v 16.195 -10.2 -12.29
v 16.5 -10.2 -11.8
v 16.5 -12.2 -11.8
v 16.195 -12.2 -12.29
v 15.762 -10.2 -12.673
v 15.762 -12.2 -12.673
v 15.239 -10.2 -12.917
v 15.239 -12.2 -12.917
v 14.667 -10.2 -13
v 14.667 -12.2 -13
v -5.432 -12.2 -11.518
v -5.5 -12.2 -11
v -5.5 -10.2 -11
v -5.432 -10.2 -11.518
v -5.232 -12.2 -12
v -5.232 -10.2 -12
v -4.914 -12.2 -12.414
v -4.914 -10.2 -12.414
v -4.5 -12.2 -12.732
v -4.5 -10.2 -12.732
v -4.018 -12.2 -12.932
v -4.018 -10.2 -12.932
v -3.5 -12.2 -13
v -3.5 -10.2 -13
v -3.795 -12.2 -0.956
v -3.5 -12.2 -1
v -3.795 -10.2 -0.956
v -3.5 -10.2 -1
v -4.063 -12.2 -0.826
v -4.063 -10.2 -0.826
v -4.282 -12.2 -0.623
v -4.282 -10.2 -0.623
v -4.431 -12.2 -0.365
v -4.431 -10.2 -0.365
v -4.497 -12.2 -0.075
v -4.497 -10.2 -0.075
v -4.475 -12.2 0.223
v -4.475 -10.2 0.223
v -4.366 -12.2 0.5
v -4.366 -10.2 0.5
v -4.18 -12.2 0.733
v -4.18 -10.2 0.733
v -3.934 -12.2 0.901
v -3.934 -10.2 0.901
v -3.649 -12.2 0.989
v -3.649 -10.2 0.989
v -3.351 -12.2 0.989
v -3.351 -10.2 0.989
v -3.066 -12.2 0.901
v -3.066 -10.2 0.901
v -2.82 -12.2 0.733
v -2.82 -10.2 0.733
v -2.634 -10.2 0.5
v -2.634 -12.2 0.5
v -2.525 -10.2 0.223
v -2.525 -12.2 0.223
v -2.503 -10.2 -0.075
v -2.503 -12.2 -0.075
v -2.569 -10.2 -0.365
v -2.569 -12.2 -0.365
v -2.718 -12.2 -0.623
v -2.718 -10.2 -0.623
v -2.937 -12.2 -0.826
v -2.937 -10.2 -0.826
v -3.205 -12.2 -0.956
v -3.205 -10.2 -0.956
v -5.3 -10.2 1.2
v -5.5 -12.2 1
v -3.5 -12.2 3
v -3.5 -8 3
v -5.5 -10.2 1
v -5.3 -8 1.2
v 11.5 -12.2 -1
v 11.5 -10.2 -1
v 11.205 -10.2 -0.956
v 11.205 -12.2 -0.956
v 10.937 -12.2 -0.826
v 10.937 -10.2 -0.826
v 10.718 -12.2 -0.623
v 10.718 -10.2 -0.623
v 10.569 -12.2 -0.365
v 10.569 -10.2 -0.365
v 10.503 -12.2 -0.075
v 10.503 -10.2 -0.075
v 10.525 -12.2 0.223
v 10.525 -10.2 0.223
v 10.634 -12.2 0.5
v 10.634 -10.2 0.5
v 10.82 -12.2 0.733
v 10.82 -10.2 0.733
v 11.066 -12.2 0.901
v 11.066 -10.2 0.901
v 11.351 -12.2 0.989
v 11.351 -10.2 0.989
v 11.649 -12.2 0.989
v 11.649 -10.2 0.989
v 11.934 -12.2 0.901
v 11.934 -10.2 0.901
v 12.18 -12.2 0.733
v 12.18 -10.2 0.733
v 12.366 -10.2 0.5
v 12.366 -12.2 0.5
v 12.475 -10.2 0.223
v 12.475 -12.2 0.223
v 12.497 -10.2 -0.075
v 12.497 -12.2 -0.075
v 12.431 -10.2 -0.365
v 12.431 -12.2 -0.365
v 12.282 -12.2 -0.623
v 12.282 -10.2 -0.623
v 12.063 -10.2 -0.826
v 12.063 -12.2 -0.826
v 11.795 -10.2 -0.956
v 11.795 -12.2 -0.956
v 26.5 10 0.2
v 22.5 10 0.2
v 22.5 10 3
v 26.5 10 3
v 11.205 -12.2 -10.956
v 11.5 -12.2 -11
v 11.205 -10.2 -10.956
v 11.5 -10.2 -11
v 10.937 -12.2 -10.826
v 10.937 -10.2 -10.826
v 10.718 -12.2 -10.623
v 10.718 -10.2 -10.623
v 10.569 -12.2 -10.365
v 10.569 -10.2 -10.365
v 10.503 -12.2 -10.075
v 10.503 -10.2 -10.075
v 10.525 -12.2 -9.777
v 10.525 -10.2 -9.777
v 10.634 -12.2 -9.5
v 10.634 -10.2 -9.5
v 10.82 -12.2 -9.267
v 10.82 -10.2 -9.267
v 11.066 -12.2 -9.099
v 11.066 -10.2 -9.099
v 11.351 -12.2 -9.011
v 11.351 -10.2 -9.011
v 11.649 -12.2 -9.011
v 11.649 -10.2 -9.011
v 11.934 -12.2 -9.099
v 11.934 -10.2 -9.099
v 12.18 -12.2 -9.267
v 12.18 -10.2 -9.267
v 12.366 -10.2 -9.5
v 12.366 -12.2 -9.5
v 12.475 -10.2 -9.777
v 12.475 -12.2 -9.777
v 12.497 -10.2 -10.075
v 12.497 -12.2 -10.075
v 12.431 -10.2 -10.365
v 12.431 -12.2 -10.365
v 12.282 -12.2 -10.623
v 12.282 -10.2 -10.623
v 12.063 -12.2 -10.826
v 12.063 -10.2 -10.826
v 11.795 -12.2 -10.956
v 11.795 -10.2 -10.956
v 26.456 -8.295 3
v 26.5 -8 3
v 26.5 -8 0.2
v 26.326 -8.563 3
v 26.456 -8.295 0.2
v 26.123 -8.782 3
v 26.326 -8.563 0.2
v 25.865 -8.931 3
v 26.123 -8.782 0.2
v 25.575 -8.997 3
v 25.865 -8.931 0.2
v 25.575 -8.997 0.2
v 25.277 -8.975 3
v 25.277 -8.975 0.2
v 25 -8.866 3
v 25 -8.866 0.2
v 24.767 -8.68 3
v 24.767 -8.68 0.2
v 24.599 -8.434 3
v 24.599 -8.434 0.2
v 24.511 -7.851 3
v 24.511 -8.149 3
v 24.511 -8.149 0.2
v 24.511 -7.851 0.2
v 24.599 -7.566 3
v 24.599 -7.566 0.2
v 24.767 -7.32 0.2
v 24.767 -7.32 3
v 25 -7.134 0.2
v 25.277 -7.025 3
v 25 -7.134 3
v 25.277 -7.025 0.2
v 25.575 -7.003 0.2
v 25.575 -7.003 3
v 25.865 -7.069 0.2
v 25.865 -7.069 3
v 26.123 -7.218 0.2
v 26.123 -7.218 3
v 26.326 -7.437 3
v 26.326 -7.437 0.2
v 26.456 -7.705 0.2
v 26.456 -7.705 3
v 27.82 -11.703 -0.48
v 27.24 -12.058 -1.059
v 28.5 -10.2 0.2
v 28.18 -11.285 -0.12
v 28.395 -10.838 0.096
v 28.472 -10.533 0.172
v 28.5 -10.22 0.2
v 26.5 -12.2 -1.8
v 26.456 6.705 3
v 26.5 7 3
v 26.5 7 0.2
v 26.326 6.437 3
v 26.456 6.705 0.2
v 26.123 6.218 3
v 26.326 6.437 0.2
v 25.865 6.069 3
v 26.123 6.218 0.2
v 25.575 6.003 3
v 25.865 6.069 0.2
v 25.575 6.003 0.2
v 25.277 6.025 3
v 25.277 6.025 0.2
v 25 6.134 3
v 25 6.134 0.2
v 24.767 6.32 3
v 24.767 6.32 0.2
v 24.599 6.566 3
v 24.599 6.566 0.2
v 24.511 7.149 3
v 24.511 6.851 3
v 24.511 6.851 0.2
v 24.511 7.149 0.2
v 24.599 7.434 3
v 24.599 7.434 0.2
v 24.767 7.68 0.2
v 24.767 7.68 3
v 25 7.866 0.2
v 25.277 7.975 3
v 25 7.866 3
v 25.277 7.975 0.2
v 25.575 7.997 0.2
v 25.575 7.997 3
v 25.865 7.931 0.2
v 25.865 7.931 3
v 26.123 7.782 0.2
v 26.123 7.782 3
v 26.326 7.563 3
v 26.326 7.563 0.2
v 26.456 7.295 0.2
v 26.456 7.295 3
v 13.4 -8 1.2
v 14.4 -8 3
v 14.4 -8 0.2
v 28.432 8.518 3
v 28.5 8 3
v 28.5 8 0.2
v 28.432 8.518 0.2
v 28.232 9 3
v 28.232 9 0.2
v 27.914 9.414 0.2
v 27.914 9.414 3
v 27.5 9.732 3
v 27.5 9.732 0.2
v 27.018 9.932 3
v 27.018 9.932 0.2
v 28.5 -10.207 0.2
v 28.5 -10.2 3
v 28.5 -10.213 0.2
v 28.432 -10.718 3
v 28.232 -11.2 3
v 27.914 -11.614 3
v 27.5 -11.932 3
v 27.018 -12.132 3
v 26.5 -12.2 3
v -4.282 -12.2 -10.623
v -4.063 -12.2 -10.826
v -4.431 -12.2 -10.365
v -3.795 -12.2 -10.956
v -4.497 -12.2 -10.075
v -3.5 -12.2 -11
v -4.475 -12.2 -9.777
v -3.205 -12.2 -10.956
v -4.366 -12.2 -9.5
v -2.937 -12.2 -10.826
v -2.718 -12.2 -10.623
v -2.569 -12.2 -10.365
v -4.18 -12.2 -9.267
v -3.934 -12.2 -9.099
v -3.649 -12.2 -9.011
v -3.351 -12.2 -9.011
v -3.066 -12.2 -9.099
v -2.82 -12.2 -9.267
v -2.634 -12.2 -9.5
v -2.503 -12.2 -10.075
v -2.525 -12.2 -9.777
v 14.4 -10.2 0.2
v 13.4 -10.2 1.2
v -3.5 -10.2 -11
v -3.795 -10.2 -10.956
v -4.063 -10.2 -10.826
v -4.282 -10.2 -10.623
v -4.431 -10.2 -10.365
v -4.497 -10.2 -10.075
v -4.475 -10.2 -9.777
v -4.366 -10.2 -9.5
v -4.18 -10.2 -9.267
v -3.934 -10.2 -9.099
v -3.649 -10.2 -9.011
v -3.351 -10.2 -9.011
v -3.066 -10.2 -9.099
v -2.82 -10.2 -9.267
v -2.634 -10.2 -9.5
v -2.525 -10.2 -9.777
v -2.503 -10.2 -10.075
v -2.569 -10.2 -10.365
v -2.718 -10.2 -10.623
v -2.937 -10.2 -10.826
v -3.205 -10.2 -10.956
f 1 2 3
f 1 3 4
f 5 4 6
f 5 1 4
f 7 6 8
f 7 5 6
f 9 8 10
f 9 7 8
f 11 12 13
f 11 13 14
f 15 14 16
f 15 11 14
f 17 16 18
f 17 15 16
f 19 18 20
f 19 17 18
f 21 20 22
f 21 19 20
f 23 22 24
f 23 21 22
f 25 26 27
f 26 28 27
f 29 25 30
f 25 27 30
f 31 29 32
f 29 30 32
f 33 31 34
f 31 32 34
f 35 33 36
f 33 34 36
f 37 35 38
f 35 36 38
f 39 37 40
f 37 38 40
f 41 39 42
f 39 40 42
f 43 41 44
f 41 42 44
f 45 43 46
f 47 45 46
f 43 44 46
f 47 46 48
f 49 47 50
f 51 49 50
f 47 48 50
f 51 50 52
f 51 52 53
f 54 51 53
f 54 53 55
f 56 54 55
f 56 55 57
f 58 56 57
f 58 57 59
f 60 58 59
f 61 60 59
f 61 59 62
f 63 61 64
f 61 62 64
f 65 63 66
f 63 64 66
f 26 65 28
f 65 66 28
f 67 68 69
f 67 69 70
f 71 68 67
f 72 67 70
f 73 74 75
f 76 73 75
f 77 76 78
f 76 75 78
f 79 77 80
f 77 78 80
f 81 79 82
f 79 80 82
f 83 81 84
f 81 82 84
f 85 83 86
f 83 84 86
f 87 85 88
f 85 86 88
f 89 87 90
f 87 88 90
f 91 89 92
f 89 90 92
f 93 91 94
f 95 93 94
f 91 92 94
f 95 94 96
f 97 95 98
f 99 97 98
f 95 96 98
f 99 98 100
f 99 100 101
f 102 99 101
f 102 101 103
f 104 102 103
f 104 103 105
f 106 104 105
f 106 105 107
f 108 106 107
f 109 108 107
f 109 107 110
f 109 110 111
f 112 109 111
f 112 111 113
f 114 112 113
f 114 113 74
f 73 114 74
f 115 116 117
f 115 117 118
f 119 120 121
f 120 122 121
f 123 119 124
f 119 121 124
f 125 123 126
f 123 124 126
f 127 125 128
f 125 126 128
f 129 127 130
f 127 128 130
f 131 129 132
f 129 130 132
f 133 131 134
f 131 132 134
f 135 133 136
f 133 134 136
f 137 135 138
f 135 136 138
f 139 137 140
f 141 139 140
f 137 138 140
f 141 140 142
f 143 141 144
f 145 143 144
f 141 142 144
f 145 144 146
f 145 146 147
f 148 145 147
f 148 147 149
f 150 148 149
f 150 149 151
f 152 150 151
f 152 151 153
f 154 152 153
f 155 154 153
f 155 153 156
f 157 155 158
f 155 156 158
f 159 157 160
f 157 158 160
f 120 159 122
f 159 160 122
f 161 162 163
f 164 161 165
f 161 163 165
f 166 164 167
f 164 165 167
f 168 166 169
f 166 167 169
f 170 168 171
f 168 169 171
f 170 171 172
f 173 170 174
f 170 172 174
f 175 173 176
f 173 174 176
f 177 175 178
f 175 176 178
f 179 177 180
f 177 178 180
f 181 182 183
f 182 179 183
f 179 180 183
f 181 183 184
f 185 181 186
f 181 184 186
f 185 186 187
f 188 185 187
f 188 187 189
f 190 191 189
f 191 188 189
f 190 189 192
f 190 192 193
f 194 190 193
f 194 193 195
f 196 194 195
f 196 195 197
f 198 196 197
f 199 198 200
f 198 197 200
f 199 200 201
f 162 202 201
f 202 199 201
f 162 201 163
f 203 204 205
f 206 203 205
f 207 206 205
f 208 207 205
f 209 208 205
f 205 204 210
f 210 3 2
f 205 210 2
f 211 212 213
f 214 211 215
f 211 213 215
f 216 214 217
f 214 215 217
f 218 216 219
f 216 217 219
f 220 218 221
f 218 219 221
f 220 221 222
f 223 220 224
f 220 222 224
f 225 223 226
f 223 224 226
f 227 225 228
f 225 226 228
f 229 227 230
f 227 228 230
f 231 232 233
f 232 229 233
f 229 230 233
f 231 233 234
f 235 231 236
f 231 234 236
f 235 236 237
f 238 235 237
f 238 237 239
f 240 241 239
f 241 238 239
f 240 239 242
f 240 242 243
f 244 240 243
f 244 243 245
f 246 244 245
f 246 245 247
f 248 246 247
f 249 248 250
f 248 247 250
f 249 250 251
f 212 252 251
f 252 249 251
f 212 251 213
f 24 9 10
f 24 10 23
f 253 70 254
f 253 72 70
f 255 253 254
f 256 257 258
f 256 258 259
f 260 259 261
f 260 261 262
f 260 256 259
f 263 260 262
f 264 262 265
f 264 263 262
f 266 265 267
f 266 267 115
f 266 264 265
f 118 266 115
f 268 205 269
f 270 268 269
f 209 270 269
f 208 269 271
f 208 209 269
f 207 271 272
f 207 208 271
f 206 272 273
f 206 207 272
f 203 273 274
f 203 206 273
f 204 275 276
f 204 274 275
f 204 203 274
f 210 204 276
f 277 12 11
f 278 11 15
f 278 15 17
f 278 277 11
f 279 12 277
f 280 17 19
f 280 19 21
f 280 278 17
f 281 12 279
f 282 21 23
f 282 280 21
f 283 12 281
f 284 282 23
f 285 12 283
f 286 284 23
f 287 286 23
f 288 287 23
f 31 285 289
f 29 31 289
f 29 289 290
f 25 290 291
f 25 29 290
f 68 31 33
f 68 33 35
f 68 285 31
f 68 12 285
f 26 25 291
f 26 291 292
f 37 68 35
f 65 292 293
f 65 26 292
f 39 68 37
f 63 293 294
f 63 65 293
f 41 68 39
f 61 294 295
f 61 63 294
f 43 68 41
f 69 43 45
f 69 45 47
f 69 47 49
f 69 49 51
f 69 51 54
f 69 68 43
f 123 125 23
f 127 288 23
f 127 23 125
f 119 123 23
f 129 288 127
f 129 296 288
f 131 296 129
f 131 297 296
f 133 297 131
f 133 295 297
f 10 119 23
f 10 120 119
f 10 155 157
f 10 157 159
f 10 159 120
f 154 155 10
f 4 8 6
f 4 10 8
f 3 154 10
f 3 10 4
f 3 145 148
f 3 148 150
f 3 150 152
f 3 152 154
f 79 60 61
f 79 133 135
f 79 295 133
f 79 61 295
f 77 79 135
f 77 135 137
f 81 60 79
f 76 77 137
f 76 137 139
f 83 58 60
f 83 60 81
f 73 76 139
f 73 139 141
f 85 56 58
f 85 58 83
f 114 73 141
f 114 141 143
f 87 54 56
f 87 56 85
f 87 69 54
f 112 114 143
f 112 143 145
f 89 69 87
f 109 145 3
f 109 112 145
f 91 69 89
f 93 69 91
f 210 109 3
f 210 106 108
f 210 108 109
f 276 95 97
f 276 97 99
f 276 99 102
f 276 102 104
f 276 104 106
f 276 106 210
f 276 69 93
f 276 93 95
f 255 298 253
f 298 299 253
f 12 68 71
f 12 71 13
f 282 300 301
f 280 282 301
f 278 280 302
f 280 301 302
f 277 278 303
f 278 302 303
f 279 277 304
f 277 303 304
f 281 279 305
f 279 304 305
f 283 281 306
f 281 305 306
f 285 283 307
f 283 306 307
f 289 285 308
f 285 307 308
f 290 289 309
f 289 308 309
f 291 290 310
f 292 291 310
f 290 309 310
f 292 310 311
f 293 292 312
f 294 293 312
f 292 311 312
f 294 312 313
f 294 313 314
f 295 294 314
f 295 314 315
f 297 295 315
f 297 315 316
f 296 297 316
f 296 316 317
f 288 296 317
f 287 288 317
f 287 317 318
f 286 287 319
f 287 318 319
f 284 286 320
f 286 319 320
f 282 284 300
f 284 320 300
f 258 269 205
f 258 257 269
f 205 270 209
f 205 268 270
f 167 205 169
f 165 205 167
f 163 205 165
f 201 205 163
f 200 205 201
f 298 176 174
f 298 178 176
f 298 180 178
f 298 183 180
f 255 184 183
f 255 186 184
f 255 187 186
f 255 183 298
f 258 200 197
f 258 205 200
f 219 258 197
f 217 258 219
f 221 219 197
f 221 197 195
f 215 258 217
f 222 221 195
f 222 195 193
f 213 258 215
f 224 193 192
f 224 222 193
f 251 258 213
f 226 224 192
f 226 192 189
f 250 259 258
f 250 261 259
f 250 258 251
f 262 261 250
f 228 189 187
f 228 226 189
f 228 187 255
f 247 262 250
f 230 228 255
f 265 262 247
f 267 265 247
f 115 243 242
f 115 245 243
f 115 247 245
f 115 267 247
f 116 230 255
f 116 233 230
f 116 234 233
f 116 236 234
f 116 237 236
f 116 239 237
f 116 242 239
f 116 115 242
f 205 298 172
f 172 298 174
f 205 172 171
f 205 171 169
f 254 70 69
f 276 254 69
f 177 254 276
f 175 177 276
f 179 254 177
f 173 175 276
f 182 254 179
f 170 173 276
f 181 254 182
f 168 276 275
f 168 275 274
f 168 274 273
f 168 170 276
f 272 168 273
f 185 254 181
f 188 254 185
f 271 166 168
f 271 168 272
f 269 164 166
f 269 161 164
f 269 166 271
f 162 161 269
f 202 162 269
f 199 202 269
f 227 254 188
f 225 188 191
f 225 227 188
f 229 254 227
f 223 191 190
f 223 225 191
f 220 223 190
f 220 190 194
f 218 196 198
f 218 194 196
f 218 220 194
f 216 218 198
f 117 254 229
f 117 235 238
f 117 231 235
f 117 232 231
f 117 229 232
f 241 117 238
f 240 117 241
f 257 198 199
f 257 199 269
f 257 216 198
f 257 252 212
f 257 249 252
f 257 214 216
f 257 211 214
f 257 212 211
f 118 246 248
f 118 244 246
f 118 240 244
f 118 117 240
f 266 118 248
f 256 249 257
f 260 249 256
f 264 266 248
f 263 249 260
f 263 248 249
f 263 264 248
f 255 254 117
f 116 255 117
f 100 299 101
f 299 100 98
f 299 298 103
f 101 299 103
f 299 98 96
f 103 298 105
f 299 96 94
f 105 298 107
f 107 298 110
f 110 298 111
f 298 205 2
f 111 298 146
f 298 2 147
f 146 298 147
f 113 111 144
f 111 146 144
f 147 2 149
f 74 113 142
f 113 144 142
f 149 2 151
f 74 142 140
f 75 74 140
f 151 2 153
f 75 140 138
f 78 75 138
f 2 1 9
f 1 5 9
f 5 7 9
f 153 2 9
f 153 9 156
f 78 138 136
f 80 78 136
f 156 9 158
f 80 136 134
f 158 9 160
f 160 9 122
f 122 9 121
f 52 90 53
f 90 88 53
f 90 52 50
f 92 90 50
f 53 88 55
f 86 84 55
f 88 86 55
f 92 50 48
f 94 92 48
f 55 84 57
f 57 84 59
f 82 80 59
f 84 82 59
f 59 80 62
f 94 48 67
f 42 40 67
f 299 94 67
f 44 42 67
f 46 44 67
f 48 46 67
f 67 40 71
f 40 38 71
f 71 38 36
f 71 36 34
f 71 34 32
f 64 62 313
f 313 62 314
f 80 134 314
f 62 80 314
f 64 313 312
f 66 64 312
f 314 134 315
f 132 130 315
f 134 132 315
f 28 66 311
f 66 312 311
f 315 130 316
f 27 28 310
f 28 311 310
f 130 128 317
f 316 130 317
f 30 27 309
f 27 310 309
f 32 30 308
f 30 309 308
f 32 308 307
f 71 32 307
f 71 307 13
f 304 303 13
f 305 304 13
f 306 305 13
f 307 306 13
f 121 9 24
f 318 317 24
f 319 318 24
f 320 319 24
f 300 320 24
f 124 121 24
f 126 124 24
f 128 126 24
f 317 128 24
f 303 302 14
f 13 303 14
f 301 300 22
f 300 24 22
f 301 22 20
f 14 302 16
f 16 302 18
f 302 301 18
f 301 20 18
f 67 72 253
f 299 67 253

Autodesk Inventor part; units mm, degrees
ref_plane "YZ Plane" through (0, 0, 0) normal (1, 0, 0) x (0, 1, 0)
ref_plane "XZ Plane" through (0, 0, 0) normal (0, 1, 0) x (-1, 0, 0)
ref_plane "XY Plane" through (0, 0, 0) normal (0, 0, 1) x (1, 0, 0)
sketch "Sketch1" plane through (0, 0, 0) normal (0, 0, 1) x (1, 0, 0)
  line L0 (22.5, 10) -> (28.5, 10)
  line L1 (28.5, 10) -> (28.5, -10)
  line L2 (28.5, -10) -> (22.5, -10)
  line L3 (22.5, -10) -> (22.5, 10)
  line L4 (22.5, -10) -> (-28.5, -10)
  line L5 (-28.5, -10) -> (-28.5, -8)
  line L6 (-28.5, -8) -> (22.5, -8)
  line L7 (22.5, -8) -> (22.5, -10)
  circle A0 centre (25.5, 7) radius 1
  circle A1 centre (25.5, -8) radius 1
  point P0 (0, 0)
  dimension "d0" = 57
  dimension "d1" = 2
  dimension "d2" = 28.5
  dimension "d3" = 20
  dimension "d4" = 10
  dimension "d5" = 54
  dimension "d6" = 54
  dimension "d7" = 2
  dimension "d8" = 17
  dimension "d9" = 3
  dimension "d10" = 3
  dimension "d11" = 2
  dimension "d12" = 2
extrude "Extrusion1" add sketch "Sketch1" along normal blind 3
sketch "Sketch2" plane through (0, 0, 3) normal (0, 0, 1) x (1, 0, 0)
  line L0 (-28.5, -10) -> (28.5, -10) projected
  line L1 (28.5, 10) -> (22.5, 10) projected
  line L2 (13.5, -10) -> (22.5, 10)
  line L3 (22.5, -8) -> (-28.5, -8) projected
  line L4 (22.5, 10) -> (22.5, -8)
  line L5 (22.5, -8) -> (13.5, -10)
  point P0 (0, 0)
  point P1 (14.4, -8)
  dimension "d15" = 42
extrude "Extrusion2" add sketch "Sketch2" against normal blind 3 contours L2 L4 L3
sketch "Sketch4" plane through (-28.5, -10, 0) normal (0, -1, 0) x (1, 0, 0)
  line L0 (0, 3) -> (57, 3) projected
  line L1 (0, 3) -> (57, 3)
  line L2 (57, 3) -> (57, -13)
  line L3 (57, -13) -> (0, -13)
  line L4 (0, -13) -> (0, 3)
  line L5 (57, 0) -> (57, 3) projected
  point P0 (28.5, 0)
  dimension "d22" = 16
extrude "Extrusion4" add sketch "Sketch4" along normal blind 2.2
sketch "Sketch5" plane through (-28.5, -10, 0) normal (0, 1, 0) x (1, 0, 0)
  line L0 (0, 0) -> (57, 0) projected
  line L1 (0, 13) -> (57, 13) projected
  line L2 (0, 0) -> (57, 0)
  line L3 (57, 0) -> (57, 13)
  line L4 (57, 13) -> (0, 13)
  line L5 (0, 13) -> (0, 0)
  point P0 (28.5, 0)
extrude "Extrusion5" cut sketch "Sketch5" against normal blind 0.2
sketch "Sketch6" plane through (0, 0, 0) normal (0, 0, -1) x (-1, 0, 0)
  line L0 (-28.5, 10) -> (-28.5, -12.2) projected
  line L1 (-28.5, -10.2) -> (28.5, -10.2) projected
  line L2 (-28.5, 10) -> (28.5, 10)
  line L3 (28.5, 10) -> (28.5, -10.2)
  line L4 (28.5, -10.2) -> (-28.5, -10.2)
  line L5 (-28.5, -10.2) -> (-28.5, 10)
  point P0 (0, 0)
extrude "Extrusion6" cut sketch "Sketch6" against normal blind 0.2
sketch "Sketch7" plane through (-28.5, -12.2, 0) normal (0, -1, 0) x (1, 0, 0)
  line L0 (0, 3) -> (0, -13) projected
  line L1 (57, 3) -> (0, 3) projected
  point P0 (28.5, 0)
  point P1 (25, 0)
  point P2 (25, -10)
  point P3 (40, 0)
  point P4 (40, -10)
  dimension "d29" = 25
  dimension "d30" = 40
  dimension "d31" = 25
  dimension "d32" = 40
  dimension "d33" = 10
  dimension "d34" = 10
  dimension "d35" = 3
  dimension "d36" = 3
hole "Hole1" at (-3.5, -12.2, 0) at (-3.5, -12.2, -10) at (11.5, -12.2, 0) at (11.5, -12.2, -10) direction (0, 1, 0) diameter 2 depth 5 tip angle 118
sketch "Sketch8" plane through (-28.5, -8, 3) normal (0, 1, 0) x (1, 0, 0)
  line L0 (42.9, 2.8) -> (40.9798, 2.8) projected
  line L1 (42.9, 2.8) -> (20.9, 2.8)
  line L2 (20.9, 2.8) -> (20.9, 1.8)
  line L3 (20.9, 1.8) -> (42.9, 1.8)
  line L4 (42.9, 1.8) -> (42.9, 2.8)
  point P0 (28.5, 3)
  dimension "d44" = 22
  dimension "d45" = 1
extrude "Extrusion7" cut sketch "Sketch8" against normal blind 2.2
chamfer "Chamfer1" distance 1 angle 45 2 edges at (-7.6, -9.1, 0.2) (14.4, -9.1, 1.2)
sketch "Sketch9" plane through (-28.5, -12.2, 0) normal (0, -1, 0) x (1, 0, 0)
  line L0 (0, 3) -> (0, -13) projected
  line L1 (0, -13) -> (57, -13) projected
  line L2 (0, 3) -> (23, 3)
  line L3 (23, 3) -> (23, -13)
  line L4 (23, -13) -> (0, -13)
  line L5 (0, -13) -> (0, 3)
  point P0 (28.5, 0)
  dimension "d51" = 23
extrude "Extrusion8" cut sketch "Sketch9" against normal blind 5
chamfer "Chamfer2" distance 2 angle 45 1 edges at (-5.5, -10.1, 3)
sketch "Sketch10" plane through (-28.5, -10.2, 0) normal (0, 1, 0) x (1, 0, 0)
  line L0 (57, -0.2) -> (51, -0.2) projected
  line L1 (23, 13) -> (57, 13) projected
  line L2 (57, -0.2) -> (45, -0.2)
  line L3 (45, -0.2) -> (45, 13)
  line L4 (45, 13) -> (57, 13)
  line L5 (57, 13) -> (57, -0.2)
  circle A0 centre (40, 0) radius 1 projected
  point P0 (28.5, 0)
  dimension "d57" = 5
extrude "Extrusion9" cut sketch "Sketch10" against normal blind 3 contours L0 L2 L3 L1 L5
chamfer "Chamfer3" distance 12 angle 45 1 edges at (16.5, -11.2, 0.2)
fillet "Fillet2" radius 2 2 edges at (16.5, -11.2, -13) (-5.5, -11.2, -13)
fillet "Fillet3" radius 2 2 edges at (28.5, 10, 1.6) (28.5, -12.2, 1.6)
properties part number "bridge_structure_B"
